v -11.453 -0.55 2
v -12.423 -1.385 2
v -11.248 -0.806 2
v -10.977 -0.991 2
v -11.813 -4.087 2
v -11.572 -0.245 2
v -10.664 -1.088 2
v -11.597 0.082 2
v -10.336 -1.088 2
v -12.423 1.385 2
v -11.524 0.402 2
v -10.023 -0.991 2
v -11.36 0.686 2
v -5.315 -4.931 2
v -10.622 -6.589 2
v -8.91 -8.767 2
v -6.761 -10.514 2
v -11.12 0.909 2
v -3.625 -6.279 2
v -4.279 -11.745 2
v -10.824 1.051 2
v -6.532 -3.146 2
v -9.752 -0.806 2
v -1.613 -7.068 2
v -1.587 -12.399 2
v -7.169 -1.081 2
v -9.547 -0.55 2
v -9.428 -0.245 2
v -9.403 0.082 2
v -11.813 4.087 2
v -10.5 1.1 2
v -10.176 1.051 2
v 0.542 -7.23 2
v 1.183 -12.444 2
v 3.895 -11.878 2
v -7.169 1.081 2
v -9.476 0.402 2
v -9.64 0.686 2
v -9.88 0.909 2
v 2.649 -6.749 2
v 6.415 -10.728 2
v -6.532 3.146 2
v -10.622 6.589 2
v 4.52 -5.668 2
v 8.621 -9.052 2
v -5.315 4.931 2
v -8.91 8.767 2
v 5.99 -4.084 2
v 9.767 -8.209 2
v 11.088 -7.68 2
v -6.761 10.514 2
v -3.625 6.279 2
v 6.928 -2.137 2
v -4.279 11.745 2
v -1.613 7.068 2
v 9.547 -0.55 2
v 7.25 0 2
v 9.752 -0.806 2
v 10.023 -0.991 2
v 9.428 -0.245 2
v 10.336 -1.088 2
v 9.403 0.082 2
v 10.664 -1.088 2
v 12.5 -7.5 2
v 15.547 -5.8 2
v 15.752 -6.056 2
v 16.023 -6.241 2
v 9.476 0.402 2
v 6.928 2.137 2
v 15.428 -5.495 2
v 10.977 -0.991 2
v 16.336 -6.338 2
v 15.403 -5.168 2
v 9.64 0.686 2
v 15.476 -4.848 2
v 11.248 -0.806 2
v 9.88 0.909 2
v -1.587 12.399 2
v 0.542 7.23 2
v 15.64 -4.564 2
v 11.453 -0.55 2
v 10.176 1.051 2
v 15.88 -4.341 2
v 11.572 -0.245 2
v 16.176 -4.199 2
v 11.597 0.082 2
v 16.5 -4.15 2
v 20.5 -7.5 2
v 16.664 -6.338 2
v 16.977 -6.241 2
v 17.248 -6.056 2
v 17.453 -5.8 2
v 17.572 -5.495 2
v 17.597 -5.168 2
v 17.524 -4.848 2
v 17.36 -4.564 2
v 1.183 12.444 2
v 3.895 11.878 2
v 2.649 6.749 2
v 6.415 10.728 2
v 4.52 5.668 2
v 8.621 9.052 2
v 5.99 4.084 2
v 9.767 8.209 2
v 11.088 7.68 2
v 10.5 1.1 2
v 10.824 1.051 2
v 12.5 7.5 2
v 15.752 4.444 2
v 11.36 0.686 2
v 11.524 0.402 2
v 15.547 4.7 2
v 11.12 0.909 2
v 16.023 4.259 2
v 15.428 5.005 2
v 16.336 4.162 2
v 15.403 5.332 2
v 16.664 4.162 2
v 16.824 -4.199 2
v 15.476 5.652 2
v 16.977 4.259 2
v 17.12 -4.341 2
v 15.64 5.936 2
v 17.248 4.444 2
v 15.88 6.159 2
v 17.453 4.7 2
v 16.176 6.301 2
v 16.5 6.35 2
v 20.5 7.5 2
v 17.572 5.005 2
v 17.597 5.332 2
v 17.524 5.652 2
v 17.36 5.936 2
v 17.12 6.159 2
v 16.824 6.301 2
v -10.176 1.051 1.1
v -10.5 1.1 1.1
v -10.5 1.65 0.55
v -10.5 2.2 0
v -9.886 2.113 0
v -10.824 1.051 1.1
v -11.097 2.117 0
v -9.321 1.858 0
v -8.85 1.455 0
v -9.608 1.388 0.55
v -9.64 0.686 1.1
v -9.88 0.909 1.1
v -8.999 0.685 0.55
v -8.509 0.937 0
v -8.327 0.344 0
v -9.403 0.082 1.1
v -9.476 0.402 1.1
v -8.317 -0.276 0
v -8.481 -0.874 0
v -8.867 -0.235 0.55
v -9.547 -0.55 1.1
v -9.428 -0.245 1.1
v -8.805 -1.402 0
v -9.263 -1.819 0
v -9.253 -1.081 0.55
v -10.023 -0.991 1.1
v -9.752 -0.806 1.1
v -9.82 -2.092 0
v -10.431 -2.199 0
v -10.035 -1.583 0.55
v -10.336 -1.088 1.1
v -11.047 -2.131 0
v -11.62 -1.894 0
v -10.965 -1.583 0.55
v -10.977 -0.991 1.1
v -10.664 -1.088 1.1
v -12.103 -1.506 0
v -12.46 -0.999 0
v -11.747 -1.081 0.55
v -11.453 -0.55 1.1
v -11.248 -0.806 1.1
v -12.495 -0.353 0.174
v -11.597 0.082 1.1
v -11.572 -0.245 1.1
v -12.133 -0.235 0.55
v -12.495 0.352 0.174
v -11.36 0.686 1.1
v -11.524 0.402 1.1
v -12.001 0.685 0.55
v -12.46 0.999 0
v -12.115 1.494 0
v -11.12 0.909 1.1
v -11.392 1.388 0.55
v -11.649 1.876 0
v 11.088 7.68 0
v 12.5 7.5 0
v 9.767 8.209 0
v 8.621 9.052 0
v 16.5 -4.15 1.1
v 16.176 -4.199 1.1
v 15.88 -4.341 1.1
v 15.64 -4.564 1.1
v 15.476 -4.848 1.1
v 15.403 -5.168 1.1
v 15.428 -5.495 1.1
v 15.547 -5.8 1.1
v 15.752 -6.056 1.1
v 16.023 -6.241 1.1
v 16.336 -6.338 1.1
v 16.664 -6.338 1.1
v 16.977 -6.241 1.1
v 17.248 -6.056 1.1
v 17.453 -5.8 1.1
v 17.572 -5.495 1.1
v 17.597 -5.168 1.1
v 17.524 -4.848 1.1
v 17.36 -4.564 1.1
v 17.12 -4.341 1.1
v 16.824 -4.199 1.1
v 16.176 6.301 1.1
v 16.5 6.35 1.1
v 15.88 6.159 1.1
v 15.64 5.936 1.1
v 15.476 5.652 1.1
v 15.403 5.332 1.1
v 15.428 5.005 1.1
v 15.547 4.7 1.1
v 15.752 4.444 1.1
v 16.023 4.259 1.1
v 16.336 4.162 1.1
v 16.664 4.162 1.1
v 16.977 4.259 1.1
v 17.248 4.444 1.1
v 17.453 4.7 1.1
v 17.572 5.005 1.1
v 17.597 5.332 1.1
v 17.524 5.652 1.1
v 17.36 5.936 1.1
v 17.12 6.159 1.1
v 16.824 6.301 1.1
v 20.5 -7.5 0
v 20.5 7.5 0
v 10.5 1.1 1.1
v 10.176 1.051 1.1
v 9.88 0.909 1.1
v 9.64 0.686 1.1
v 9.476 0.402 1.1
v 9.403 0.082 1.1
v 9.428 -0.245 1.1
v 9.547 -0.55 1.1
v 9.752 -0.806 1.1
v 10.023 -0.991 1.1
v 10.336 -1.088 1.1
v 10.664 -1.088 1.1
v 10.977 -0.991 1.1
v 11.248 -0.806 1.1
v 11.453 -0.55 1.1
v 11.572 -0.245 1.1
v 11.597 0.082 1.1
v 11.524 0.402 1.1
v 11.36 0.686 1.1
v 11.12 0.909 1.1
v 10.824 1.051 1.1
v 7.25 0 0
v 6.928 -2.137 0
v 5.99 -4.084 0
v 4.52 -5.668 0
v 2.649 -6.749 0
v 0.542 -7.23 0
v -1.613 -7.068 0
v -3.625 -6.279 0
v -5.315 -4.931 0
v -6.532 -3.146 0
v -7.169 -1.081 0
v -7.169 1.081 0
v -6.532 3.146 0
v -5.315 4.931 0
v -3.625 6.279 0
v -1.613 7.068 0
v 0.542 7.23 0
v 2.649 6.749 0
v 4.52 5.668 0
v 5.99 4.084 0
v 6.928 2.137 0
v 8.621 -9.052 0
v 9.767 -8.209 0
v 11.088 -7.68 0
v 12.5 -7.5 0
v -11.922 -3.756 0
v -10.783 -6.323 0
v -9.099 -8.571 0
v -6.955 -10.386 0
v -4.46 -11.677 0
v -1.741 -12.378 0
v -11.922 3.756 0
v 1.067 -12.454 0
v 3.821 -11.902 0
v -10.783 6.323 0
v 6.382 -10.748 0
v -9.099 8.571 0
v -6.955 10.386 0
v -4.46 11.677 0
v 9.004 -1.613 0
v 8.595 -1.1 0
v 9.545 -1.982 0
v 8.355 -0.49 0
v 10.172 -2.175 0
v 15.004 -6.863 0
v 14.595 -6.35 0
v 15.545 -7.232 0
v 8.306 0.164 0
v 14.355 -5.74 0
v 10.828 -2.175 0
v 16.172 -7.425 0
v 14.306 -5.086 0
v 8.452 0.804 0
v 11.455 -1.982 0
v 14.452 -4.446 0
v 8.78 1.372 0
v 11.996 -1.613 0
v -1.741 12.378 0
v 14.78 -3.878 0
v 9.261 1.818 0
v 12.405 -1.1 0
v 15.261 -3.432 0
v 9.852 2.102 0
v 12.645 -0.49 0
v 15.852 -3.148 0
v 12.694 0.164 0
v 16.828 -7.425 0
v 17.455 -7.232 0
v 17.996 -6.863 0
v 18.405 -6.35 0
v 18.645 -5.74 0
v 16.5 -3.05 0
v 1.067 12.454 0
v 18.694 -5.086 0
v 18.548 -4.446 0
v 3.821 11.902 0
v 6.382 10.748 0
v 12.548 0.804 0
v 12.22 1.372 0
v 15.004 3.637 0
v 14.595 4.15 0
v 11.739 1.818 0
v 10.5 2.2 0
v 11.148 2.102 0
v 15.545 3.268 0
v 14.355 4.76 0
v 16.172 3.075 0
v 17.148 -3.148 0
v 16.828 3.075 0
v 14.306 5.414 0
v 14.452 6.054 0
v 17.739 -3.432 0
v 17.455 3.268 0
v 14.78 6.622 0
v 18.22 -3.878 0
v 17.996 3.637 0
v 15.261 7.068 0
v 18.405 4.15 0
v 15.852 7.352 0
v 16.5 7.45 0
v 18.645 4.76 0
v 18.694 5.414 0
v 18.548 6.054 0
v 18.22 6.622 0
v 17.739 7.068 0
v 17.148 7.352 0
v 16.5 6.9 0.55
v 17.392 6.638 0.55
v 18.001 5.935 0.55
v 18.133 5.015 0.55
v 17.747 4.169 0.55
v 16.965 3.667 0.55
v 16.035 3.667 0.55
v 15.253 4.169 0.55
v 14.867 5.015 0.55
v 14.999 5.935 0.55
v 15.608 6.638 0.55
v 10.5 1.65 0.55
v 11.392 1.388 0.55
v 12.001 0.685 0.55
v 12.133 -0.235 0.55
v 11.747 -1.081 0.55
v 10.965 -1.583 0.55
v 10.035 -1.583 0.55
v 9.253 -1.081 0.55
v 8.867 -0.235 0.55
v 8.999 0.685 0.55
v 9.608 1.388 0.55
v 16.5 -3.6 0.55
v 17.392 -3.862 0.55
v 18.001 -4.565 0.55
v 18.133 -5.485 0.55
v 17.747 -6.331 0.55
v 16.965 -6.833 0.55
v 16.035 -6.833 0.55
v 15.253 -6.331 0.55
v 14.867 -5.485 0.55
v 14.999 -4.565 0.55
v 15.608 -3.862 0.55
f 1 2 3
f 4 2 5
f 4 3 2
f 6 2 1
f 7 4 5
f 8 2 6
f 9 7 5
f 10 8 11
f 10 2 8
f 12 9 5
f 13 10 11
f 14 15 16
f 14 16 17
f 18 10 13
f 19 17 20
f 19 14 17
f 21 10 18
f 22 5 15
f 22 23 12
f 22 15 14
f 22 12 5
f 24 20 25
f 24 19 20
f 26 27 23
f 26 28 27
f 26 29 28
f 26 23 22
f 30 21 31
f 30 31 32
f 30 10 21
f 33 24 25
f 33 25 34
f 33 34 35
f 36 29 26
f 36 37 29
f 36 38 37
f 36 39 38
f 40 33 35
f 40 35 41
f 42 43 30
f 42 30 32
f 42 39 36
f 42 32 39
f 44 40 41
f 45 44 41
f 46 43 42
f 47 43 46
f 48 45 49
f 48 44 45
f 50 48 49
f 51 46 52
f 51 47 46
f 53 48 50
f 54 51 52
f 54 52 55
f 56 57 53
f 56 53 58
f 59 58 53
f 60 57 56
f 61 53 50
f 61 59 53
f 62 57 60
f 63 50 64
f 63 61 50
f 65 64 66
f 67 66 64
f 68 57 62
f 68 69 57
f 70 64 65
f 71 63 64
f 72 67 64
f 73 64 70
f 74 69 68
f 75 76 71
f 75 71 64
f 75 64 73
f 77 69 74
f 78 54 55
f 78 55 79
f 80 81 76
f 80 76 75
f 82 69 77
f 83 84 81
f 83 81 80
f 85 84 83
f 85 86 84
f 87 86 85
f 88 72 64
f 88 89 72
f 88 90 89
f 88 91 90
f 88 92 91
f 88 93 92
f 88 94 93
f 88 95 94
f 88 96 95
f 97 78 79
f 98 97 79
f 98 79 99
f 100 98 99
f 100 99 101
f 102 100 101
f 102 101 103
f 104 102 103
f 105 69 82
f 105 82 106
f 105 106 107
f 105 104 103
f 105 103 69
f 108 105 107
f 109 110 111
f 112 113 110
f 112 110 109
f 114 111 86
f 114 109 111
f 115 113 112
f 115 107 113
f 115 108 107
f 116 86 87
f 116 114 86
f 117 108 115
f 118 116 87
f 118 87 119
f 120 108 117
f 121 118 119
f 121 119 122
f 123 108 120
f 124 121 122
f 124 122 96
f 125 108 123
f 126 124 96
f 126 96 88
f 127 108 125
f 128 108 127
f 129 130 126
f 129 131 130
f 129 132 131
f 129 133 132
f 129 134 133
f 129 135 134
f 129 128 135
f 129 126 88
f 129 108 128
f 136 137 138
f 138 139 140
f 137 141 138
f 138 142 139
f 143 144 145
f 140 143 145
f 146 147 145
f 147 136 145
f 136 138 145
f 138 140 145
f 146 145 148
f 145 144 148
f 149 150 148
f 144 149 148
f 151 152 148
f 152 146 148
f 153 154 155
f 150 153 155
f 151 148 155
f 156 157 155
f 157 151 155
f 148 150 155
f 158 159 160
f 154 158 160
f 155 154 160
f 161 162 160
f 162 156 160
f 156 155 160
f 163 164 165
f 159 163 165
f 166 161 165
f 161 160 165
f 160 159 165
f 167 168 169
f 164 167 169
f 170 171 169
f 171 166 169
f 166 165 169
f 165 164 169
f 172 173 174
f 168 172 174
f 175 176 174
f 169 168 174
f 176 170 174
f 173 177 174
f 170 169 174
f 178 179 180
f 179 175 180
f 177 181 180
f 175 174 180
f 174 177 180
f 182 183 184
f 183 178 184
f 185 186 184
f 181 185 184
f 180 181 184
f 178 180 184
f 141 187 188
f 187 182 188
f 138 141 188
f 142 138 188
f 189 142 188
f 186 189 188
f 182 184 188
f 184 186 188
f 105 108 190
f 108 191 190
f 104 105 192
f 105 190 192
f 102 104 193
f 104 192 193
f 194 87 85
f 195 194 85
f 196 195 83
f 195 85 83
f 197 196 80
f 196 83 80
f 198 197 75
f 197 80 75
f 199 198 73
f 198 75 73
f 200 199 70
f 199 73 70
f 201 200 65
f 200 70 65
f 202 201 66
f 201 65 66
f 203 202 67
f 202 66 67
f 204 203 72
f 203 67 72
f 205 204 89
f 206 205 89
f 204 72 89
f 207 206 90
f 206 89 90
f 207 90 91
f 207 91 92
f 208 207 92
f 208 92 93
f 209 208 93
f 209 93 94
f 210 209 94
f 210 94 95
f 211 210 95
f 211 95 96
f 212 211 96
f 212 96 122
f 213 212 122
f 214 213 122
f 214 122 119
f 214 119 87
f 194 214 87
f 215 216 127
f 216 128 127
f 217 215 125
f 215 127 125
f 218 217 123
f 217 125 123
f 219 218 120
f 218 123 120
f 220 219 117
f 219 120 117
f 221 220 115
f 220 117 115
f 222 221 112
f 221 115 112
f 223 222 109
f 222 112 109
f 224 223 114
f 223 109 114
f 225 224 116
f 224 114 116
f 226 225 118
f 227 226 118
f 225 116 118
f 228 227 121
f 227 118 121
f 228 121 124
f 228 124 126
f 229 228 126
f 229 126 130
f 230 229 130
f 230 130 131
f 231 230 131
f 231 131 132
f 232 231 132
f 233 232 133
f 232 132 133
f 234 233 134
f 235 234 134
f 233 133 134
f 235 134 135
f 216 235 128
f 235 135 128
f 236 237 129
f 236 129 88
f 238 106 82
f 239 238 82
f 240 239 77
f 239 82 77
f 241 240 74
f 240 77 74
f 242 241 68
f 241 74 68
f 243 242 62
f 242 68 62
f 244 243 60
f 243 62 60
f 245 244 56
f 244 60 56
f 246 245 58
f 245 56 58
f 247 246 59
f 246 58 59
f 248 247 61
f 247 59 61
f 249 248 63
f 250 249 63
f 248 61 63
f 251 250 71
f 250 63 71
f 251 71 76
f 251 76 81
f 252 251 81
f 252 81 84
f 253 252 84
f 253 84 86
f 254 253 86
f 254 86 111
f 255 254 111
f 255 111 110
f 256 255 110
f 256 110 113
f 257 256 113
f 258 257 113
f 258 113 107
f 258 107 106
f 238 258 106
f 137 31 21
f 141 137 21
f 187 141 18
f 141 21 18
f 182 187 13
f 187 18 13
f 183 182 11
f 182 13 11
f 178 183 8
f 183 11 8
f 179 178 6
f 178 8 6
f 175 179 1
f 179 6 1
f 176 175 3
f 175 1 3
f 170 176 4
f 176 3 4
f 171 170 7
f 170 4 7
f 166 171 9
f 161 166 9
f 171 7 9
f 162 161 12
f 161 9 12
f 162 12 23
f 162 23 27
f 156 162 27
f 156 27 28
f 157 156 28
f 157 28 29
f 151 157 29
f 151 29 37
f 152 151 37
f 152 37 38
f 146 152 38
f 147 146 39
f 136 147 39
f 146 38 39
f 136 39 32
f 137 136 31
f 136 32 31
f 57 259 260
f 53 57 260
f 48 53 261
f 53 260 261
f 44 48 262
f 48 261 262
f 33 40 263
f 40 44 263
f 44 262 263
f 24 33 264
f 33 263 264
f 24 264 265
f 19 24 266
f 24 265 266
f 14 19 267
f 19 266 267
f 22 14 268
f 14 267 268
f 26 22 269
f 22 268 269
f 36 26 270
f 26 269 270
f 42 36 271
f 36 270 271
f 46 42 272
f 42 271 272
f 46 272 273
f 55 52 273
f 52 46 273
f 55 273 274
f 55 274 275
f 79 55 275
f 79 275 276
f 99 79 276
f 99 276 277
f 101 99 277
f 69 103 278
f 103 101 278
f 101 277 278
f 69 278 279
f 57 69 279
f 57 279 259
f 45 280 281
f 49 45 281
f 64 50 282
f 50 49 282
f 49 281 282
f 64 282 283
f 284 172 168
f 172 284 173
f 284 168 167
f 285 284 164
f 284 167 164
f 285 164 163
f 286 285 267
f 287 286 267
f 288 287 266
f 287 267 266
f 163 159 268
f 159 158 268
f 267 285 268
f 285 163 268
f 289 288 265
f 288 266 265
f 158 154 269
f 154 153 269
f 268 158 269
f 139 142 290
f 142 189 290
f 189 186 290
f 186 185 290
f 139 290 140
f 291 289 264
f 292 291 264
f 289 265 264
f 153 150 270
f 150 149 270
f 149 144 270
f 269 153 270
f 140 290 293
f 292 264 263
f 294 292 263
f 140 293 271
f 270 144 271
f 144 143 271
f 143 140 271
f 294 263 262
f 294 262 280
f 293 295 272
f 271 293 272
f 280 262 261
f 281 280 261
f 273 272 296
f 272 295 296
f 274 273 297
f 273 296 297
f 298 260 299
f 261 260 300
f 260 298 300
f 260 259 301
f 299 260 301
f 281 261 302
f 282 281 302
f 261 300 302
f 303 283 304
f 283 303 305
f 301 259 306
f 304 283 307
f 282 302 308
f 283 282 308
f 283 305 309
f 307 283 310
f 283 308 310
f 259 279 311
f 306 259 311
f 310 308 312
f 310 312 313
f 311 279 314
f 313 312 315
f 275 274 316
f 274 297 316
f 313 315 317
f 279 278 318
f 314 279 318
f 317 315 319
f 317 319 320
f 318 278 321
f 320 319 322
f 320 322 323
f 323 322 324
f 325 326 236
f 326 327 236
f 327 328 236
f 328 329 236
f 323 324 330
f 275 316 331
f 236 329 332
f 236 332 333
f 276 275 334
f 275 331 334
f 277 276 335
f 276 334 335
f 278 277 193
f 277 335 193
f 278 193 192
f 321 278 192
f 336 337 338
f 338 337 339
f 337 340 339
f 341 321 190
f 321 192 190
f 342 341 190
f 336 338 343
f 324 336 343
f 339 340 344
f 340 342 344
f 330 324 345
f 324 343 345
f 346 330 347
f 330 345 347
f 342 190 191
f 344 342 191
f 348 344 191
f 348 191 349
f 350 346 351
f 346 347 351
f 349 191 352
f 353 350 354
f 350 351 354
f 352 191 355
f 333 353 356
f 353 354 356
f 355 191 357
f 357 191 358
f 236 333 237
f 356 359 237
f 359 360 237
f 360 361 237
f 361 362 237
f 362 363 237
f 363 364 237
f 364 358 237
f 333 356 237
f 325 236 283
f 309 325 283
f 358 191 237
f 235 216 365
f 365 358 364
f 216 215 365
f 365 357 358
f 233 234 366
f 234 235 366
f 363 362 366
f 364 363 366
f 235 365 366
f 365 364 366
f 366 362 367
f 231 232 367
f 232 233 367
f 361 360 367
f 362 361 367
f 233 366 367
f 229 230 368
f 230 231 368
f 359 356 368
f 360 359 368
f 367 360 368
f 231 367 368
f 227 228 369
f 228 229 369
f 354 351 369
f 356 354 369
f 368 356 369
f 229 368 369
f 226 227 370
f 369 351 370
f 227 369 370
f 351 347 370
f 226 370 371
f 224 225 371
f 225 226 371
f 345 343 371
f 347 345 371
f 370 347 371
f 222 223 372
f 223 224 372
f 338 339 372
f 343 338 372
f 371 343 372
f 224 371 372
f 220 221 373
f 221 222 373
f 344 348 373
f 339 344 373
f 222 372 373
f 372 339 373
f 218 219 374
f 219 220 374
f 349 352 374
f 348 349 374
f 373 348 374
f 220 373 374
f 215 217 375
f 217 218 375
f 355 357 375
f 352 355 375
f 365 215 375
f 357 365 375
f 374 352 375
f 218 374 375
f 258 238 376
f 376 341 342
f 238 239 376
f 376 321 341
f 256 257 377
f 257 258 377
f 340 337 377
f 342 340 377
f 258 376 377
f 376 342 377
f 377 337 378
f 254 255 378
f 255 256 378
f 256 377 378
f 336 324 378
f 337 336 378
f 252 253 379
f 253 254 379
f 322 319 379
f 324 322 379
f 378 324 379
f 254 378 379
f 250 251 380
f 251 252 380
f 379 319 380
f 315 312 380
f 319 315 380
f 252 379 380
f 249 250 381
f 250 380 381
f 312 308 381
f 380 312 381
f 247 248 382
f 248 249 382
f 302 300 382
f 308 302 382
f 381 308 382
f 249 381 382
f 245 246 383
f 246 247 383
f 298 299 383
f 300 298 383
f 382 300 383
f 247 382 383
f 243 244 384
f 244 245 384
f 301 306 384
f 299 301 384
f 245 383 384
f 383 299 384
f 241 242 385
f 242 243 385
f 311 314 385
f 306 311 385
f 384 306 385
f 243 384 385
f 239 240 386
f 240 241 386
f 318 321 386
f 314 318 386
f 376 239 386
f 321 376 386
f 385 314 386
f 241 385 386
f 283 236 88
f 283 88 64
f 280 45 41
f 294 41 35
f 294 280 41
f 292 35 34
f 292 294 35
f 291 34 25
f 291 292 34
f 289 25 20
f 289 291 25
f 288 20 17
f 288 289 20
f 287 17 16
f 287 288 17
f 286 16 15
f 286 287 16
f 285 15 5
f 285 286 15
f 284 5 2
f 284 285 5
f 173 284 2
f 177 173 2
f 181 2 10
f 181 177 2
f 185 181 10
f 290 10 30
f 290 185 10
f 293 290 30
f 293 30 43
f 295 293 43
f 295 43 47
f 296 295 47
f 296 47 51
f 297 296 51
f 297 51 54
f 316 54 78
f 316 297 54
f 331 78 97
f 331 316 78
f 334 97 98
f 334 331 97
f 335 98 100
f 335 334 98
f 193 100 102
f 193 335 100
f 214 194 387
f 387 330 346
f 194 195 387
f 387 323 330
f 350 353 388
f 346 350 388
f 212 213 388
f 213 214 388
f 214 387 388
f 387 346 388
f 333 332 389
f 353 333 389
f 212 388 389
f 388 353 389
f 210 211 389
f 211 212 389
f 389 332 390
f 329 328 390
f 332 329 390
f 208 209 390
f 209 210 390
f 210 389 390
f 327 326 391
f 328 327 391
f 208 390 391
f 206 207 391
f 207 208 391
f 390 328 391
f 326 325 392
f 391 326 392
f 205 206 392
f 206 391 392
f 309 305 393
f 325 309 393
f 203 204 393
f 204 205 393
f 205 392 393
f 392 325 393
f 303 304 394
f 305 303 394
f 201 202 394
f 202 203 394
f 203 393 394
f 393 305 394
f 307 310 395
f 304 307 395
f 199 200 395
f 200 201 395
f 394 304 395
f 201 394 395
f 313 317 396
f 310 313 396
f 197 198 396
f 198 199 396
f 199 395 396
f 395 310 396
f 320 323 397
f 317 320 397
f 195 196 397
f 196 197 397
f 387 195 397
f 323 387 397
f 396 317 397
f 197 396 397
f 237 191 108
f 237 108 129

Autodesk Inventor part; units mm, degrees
ref_plane "YZ Plane" through (0, 0, 0) normal (1, 0, 0) x (0, 1, 0)
ref_plane "XZ Plane" through (0, 0, 0) normal (0, 1, 0) x (-1, 0, 0)
ref_plane "XY Plane" through (0, 0, 0) normal (0, 0, 1) x (1, 0, 0)
sketch "Skizze1" plane through (0, 0, 0) normal (0, 0, 1) x (1, 0, 0)
  line L0 (0, 0) -> (20.5, 0) construction
  circle A0 centre (0, 0) radius 7.25
  arc A1 (8.6207, 9.0517) -> (12.5, 7.5) centre (12.5, 13.125) ccw
  arc A2 (12.5, -7.5) -> (8.6207, -9.0517) centre (12.5, -13.125) ccw
  line L1 (12.5, 7.5) -> (20.5, 7.5)
  line L2 (20.5, 7.5) -> (20.5, -7.5)
  line L3 (20.5, -7.5) -> (12.5, -7.5)
  line L4 (12.5, -7.5) -> (12.5, 7.5) construction
  circle A3 centre (0, 0) radius 10.5 construction
  line L5 (0, 0) -> (-10.5, 0) construction
  line L6 (16.5, 5.25) -> (16.5, -5.25) construction
  line L7 (16.5, 7.5) -> (16.5, -7.5) construction
  circle A4 centre (0, 0) radius 12.5
  point P0 (12.5, 0)
  point P1 (10.5, 0)
  point P2 (16.5, 0)
  dimension "d105" = 14.5
  dimension "d106" = 15
  dimension "LowerArm_ShaftFixation_Width" = 8
  dimension "d127" = 21
  dimension "d130" = 360
  dimension "d132" = 10.5
  dimension "d150" = 25
extrude "Grundprofil" add sketch "Skizze1" along normal blind 2
hole "Hole10" at (10.5, 0, 0) at (-10.5, 0, 0) direction (0, 0, 1) diameter 2.2 depth 12 tip angle 118 countersink diameter 4.4 countersink angle 90 clearance for "Countersunk Flat Head Screw DIN EN ISO 2009" size "M2" standard "DIN"
hole "Hole11" at (16.5, 5.25, 0) at (16.5, -5.25, 0) direction (0, 0, 1) diameter 2.2 depth 3 tip angle 118 countersink diameter 4.4 countersink angle 90 clearance for "Countersunk Raised Head Screw ISO 2010/7047" size "M2" standard "ISO"
properties part number "Lower_Arm_v4" material "Aluminum 6061"
